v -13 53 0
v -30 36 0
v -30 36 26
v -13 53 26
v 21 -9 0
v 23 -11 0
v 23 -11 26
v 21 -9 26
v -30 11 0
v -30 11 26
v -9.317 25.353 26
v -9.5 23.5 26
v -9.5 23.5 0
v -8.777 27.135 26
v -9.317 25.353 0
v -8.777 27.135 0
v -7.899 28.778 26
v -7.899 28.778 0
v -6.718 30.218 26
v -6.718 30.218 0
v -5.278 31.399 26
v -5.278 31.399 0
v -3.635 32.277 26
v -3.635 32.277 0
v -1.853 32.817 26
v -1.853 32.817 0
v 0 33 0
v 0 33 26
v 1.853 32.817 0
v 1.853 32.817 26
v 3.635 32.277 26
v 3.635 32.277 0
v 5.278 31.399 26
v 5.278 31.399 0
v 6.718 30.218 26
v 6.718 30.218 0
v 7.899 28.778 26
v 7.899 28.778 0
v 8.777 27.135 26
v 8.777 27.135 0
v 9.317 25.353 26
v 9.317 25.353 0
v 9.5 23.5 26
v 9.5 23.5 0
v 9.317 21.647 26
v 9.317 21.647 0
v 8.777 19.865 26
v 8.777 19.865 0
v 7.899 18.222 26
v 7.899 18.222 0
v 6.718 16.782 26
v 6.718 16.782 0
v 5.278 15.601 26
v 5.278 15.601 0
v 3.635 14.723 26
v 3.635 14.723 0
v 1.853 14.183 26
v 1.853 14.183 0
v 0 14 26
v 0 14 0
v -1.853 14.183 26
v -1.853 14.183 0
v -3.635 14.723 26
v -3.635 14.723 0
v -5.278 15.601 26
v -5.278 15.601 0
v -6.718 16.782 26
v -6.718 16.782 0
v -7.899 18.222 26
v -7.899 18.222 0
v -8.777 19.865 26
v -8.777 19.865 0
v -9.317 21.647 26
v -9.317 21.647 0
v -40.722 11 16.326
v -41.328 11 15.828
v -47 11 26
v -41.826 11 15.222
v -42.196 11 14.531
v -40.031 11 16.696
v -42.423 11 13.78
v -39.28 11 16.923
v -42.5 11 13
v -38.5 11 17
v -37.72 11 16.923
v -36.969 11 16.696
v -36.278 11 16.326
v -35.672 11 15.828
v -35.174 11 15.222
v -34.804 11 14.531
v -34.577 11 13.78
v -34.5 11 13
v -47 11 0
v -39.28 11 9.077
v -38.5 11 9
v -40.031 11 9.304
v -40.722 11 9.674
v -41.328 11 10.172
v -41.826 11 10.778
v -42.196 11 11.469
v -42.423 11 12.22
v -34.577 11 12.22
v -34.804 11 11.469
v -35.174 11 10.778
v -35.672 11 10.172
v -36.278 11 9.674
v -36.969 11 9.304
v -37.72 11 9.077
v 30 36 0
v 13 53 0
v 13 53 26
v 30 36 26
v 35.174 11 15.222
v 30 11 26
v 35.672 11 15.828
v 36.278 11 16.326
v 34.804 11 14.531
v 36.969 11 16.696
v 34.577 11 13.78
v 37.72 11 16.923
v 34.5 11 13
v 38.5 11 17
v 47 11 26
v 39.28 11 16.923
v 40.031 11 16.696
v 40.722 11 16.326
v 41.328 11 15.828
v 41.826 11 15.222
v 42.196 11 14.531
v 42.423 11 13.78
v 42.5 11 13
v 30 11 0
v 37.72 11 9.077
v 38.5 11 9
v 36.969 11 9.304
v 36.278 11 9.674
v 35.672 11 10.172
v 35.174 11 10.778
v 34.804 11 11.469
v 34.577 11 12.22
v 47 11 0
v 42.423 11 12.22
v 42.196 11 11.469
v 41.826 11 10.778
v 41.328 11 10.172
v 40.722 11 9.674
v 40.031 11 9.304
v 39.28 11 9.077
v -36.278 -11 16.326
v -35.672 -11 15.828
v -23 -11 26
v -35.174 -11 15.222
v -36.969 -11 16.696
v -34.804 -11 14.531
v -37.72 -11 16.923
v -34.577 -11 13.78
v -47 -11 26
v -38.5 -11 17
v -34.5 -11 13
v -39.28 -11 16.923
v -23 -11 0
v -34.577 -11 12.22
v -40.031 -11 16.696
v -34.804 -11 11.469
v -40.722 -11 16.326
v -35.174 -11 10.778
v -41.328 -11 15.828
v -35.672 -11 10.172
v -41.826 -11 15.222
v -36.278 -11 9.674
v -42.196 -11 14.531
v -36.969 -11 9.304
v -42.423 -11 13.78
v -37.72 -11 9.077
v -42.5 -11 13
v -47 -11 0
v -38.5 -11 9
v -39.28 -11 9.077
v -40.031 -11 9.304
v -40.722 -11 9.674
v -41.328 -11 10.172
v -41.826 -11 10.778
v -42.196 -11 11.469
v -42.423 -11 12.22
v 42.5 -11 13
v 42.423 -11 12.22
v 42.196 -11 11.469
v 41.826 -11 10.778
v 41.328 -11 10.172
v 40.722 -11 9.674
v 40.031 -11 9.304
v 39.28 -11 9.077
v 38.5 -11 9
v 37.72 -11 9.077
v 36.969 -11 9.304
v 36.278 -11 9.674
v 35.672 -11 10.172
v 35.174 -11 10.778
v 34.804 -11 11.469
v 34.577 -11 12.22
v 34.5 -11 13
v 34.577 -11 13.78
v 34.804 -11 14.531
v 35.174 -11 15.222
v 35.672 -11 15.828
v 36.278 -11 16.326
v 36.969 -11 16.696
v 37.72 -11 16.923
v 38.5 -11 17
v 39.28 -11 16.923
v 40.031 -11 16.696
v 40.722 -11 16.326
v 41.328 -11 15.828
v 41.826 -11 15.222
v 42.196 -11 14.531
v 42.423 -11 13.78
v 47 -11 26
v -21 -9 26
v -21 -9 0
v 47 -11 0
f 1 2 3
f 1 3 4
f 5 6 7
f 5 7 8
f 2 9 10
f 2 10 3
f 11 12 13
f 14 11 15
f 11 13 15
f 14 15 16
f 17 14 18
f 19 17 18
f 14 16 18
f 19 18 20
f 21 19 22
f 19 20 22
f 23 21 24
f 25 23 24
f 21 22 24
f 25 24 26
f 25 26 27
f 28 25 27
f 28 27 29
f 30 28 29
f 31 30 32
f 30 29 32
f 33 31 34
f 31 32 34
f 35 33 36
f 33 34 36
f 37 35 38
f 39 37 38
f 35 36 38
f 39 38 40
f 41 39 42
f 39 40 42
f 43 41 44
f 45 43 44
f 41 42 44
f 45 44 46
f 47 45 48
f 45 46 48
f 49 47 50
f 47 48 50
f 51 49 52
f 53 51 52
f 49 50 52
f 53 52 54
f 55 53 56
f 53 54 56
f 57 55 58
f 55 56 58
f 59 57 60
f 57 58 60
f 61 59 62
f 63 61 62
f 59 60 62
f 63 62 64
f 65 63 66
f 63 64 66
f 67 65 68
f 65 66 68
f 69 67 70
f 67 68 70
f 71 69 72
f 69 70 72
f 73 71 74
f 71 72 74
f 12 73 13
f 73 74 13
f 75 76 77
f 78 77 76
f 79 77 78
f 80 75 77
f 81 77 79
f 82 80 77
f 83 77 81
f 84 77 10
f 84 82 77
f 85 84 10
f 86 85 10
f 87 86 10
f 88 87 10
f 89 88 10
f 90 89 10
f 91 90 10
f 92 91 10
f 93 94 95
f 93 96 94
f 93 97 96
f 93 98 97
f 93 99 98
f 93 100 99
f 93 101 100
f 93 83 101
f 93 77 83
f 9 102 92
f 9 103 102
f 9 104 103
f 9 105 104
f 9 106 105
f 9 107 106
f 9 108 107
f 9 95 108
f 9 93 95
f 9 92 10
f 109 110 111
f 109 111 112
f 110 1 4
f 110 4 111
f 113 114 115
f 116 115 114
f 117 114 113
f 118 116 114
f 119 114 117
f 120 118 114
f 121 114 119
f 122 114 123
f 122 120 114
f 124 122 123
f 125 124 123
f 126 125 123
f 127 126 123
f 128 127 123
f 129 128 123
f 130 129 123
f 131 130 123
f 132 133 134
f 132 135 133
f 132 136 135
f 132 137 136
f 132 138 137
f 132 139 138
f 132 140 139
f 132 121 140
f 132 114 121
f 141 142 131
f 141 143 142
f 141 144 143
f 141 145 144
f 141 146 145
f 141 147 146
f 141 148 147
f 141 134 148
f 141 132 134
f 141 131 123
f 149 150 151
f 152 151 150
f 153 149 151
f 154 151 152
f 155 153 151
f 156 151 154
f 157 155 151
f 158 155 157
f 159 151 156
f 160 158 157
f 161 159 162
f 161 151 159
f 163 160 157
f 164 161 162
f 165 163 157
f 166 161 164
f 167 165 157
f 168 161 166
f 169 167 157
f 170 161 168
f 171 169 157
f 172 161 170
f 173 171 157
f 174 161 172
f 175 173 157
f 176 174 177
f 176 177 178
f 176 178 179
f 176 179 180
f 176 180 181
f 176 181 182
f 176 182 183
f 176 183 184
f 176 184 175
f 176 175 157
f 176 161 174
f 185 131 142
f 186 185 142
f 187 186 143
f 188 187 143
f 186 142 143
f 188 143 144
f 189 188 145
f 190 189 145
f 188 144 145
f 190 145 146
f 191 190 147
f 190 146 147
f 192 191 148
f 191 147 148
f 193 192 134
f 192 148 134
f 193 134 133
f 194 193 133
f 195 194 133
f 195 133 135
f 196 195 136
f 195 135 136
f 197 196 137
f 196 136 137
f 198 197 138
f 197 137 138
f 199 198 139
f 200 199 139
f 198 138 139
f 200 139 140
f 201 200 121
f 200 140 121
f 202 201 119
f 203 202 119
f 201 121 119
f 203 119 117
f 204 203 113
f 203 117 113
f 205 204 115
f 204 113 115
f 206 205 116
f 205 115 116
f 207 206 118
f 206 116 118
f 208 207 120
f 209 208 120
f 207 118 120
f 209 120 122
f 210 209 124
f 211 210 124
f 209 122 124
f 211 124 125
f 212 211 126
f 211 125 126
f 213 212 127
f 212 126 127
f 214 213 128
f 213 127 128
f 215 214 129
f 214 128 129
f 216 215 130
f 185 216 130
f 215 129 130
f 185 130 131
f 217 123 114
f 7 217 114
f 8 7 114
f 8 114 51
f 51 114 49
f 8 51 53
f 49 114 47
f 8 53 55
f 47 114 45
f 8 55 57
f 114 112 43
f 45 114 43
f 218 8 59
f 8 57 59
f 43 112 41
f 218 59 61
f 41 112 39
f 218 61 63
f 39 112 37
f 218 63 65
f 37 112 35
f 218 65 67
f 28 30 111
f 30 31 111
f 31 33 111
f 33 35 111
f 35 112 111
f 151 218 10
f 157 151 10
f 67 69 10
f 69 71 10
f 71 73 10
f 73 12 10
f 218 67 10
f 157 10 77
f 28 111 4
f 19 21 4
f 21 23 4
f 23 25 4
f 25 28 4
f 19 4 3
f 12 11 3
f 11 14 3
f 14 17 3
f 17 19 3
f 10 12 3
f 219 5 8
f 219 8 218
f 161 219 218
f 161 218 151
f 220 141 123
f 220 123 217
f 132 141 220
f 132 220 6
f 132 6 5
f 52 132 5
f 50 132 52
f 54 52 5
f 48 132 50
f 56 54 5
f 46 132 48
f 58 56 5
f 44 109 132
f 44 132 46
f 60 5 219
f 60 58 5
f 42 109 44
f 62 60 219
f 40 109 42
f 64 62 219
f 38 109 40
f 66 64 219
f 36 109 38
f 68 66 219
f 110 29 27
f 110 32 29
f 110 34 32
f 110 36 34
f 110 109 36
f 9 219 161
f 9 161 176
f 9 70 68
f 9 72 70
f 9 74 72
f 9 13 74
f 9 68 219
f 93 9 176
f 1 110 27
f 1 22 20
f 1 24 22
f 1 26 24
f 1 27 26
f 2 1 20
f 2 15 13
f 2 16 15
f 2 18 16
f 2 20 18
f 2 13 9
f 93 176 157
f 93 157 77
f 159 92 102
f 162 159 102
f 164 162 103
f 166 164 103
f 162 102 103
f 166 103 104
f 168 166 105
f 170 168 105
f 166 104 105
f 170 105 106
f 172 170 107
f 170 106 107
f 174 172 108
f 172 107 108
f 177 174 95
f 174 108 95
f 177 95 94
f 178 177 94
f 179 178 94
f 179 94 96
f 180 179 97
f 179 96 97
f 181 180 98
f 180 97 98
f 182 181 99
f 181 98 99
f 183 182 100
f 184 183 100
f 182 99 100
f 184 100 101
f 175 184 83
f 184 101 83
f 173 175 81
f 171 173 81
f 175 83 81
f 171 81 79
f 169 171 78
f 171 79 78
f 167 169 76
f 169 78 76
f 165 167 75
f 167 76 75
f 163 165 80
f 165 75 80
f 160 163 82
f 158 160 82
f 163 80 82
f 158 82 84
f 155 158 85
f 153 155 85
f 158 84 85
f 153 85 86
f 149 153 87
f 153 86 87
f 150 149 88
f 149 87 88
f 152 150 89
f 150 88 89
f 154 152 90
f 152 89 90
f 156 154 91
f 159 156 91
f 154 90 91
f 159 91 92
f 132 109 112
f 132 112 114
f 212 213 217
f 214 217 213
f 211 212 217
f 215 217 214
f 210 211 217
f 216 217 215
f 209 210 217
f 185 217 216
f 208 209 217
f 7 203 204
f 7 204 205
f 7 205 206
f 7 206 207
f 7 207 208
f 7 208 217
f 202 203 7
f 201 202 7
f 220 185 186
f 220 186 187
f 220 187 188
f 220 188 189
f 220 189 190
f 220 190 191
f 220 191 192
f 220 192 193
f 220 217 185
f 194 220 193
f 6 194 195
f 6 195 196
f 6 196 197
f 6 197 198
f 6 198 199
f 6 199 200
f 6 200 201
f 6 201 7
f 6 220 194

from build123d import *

# Parameters (mm, degrees)
DODANIE_WYCI_GNI_CIE1_DEPTH = 26
SZKIC3_R                    = 9.5
WYTNIJ_WYCI_GNI_CIE1_DEPTH  = 26
SZKIC4_R                    = 4
WYTNIJ_WYCI_GNI_CIE2_DEPTH  = 22


with BuildPart() as part:
    # Szkic1 → Dodanie-wyciągnięcie1 (new body)
    with BuildSketch(Plane.XY):
        Polygon((-47, 11), (-30, 11), (-30, 36), (-13, 53), (13, 53), (30, 36), (30, 11), (47, 11), (47, -11), (23, -11), (21, -9), (-21, -9), (-23, -11), (-47, -11), align=None)
    extrude(amount=DODANIE_WYCI_GNI_CIE1_DEPTH)

    # Szkic3 → Wytnij-wyciągnięcie1 (cut)
    with BuildSketch(Plane(origin=(0, 0, 0), x_dir=(-1, 0, 0), z_dir=(0, 0, -1))):
        with Locations((0, 23.5)):
            Circle(SZKIC3_R)
    extrude(amount=-WYTNIJ_WYCI_GNI_CIE1_DEPTH, mode=Mode.SUBTRACT)

    # Szkic4 → Wytnij-wyciągnięcie2 (cut)
    with BuildSketch(Plane(origin=(0, 11, 0), x_dir=(1, 0, 0), z_dir=(0, 1, 0))):
        with Locations((38.5, -13)):
            Circle(SZKIC4_R)
        with Locations((-38.5, -13)):
            Circle(SZKIC4_R)
    extrude(amount=-WYTNIJ_WYCI_GNI_CIE2_DEPTH, mode=Mode.SUBTRACT)


solid = part.part
